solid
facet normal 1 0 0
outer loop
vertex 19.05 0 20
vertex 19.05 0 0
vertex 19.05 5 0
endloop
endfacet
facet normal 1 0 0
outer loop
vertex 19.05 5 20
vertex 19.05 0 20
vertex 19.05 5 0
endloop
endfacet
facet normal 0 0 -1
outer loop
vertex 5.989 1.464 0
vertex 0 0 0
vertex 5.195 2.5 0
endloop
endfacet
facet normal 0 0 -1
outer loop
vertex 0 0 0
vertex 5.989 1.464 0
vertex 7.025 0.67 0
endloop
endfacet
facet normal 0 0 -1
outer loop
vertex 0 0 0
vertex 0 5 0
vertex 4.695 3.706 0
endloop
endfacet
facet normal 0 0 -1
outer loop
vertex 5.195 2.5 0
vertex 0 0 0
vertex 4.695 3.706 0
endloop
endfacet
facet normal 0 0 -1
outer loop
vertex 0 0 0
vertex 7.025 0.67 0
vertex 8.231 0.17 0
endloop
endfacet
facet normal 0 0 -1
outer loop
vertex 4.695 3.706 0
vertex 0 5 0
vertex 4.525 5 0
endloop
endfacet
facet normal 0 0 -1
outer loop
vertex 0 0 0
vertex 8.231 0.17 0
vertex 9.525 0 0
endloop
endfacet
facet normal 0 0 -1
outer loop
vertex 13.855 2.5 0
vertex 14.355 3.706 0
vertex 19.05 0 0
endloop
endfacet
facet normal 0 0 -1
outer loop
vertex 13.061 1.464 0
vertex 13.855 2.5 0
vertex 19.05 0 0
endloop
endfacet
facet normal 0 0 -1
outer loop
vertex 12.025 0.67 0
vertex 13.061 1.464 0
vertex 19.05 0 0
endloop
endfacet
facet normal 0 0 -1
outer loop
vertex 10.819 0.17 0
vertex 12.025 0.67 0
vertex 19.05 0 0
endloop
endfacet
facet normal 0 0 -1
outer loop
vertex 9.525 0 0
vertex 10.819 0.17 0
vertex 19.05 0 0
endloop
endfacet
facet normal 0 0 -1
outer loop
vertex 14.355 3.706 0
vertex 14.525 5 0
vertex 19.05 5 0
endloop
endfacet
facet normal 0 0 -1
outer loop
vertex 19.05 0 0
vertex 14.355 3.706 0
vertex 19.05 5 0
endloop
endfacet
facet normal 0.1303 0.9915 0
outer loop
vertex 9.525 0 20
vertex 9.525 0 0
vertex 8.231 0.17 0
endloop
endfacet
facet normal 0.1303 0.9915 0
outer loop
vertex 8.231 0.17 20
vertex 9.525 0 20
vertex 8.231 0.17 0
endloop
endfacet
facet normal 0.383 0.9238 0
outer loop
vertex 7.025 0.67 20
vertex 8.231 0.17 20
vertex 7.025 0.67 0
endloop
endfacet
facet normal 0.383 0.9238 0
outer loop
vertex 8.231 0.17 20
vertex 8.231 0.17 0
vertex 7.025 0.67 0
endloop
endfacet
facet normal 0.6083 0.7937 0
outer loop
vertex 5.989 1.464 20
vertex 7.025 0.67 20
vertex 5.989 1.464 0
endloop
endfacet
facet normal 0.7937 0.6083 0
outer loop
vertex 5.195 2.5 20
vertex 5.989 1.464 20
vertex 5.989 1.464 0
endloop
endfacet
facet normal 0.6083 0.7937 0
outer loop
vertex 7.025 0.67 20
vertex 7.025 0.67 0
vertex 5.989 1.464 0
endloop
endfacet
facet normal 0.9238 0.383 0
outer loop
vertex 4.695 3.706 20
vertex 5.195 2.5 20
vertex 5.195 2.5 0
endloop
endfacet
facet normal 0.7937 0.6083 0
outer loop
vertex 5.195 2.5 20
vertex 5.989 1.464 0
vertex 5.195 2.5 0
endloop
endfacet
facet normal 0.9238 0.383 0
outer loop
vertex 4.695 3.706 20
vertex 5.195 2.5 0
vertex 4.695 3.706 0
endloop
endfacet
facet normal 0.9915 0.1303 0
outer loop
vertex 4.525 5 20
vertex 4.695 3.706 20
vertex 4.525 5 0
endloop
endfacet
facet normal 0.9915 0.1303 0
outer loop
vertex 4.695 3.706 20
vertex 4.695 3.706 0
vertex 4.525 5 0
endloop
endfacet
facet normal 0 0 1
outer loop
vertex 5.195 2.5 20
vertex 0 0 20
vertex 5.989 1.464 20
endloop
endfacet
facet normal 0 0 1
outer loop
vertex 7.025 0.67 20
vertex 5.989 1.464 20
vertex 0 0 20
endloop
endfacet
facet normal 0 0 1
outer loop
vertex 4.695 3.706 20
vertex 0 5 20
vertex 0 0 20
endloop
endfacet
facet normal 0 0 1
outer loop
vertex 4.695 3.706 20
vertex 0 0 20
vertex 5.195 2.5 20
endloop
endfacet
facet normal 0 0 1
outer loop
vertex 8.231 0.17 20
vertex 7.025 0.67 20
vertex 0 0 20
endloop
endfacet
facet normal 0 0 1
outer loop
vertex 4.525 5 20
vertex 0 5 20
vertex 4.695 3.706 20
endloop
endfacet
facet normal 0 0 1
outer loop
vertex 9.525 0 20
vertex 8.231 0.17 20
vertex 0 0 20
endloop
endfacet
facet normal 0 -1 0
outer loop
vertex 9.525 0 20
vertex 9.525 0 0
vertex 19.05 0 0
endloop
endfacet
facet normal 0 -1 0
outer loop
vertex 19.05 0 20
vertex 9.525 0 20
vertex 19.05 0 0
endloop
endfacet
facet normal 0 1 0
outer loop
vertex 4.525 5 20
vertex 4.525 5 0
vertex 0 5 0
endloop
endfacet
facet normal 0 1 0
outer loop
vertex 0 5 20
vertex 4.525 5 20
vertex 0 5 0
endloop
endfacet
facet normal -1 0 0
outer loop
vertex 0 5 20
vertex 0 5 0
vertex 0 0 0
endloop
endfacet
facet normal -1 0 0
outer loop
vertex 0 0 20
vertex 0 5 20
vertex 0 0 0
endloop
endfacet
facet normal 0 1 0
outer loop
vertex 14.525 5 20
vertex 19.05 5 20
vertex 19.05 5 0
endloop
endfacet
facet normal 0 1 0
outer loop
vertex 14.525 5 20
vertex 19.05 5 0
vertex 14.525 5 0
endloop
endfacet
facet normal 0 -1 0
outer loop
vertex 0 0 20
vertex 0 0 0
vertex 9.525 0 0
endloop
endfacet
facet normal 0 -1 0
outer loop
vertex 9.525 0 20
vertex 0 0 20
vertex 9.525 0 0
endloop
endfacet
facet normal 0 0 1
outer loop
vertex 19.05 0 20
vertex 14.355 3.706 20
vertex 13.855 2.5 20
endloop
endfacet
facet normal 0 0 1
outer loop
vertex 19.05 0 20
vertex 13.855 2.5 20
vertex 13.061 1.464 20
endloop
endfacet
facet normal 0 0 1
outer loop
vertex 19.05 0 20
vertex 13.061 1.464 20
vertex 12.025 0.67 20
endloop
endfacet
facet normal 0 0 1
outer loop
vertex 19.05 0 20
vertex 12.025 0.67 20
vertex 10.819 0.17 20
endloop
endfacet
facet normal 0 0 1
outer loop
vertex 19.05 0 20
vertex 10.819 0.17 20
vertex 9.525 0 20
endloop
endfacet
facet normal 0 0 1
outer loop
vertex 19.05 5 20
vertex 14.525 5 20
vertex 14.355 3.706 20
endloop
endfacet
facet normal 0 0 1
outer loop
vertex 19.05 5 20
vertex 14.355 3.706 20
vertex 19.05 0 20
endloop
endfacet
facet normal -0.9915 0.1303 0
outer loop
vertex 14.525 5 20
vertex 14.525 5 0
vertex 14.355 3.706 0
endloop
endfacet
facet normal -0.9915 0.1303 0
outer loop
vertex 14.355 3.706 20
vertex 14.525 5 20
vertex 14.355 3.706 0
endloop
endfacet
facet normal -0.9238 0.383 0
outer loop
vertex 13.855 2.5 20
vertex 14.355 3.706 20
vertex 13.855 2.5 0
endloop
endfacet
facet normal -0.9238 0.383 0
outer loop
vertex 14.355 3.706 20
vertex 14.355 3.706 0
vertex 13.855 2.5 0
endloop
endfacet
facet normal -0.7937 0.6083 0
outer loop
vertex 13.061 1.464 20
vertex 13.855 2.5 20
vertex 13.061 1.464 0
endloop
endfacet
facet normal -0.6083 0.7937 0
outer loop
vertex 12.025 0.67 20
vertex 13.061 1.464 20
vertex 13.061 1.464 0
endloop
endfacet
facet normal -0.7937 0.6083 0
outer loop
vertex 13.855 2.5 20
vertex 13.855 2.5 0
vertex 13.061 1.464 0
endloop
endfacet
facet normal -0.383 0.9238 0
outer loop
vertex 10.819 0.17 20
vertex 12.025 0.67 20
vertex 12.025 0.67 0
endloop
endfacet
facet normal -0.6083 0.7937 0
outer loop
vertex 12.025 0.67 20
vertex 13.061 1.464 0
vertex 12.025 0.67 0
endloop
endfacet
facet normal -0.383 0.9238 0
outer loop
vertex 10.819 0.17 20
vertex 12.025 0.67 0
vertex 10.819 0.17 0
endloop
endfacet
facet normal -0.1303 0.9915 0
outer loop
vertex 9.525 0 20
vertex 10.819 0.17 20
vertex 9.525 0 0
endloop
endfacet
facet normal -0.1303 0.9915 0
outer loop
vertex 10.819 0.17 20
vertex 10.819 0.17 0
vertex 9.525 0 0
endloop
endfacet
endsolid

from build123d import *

# Parameters (mm, degrees)
BOSS_EXTRUDE1_DEPTH   = 20
BOSS_EXTRUDE1_2_DEPTH = 20


with BuildPart() as part:
    # Sketch1 → Boss-Extrude1 (new body)
    with BuildSketch(Plane.XY):
        with BuildLine():
            Line((0, 5), (0, 0))
            Line((0, 0), (9.525, 0))
            ThreePointArc((9.525, 0), (5.989466094, 1.464466094), (4.525, 5))
            Line((4.525, 5), (0, 5))
        make_face()
    extrude(amount=BOSS_EXTRUDE1_DEPTH)


with BuildPart() as body_2:
    # Sketch1 → Boss-Extrude1 2 (new body)
    with BuildSketch(Plane.XY):
        with BuildLine():
            ThreePointArc((14.525, 5), (13.060533906, 1.464466094), (9.525, 0))
            Line((9.525, 0), (19.05, 0))
            Line((19.05, 0), (19.05, 5))
            Line((19.05, 5), (14.525, 5))
        make_face()
    extrude(amount=BOSS_EXTRUDE1_2_DEPTH)


solid = Compound([part.part, body_2.part])
